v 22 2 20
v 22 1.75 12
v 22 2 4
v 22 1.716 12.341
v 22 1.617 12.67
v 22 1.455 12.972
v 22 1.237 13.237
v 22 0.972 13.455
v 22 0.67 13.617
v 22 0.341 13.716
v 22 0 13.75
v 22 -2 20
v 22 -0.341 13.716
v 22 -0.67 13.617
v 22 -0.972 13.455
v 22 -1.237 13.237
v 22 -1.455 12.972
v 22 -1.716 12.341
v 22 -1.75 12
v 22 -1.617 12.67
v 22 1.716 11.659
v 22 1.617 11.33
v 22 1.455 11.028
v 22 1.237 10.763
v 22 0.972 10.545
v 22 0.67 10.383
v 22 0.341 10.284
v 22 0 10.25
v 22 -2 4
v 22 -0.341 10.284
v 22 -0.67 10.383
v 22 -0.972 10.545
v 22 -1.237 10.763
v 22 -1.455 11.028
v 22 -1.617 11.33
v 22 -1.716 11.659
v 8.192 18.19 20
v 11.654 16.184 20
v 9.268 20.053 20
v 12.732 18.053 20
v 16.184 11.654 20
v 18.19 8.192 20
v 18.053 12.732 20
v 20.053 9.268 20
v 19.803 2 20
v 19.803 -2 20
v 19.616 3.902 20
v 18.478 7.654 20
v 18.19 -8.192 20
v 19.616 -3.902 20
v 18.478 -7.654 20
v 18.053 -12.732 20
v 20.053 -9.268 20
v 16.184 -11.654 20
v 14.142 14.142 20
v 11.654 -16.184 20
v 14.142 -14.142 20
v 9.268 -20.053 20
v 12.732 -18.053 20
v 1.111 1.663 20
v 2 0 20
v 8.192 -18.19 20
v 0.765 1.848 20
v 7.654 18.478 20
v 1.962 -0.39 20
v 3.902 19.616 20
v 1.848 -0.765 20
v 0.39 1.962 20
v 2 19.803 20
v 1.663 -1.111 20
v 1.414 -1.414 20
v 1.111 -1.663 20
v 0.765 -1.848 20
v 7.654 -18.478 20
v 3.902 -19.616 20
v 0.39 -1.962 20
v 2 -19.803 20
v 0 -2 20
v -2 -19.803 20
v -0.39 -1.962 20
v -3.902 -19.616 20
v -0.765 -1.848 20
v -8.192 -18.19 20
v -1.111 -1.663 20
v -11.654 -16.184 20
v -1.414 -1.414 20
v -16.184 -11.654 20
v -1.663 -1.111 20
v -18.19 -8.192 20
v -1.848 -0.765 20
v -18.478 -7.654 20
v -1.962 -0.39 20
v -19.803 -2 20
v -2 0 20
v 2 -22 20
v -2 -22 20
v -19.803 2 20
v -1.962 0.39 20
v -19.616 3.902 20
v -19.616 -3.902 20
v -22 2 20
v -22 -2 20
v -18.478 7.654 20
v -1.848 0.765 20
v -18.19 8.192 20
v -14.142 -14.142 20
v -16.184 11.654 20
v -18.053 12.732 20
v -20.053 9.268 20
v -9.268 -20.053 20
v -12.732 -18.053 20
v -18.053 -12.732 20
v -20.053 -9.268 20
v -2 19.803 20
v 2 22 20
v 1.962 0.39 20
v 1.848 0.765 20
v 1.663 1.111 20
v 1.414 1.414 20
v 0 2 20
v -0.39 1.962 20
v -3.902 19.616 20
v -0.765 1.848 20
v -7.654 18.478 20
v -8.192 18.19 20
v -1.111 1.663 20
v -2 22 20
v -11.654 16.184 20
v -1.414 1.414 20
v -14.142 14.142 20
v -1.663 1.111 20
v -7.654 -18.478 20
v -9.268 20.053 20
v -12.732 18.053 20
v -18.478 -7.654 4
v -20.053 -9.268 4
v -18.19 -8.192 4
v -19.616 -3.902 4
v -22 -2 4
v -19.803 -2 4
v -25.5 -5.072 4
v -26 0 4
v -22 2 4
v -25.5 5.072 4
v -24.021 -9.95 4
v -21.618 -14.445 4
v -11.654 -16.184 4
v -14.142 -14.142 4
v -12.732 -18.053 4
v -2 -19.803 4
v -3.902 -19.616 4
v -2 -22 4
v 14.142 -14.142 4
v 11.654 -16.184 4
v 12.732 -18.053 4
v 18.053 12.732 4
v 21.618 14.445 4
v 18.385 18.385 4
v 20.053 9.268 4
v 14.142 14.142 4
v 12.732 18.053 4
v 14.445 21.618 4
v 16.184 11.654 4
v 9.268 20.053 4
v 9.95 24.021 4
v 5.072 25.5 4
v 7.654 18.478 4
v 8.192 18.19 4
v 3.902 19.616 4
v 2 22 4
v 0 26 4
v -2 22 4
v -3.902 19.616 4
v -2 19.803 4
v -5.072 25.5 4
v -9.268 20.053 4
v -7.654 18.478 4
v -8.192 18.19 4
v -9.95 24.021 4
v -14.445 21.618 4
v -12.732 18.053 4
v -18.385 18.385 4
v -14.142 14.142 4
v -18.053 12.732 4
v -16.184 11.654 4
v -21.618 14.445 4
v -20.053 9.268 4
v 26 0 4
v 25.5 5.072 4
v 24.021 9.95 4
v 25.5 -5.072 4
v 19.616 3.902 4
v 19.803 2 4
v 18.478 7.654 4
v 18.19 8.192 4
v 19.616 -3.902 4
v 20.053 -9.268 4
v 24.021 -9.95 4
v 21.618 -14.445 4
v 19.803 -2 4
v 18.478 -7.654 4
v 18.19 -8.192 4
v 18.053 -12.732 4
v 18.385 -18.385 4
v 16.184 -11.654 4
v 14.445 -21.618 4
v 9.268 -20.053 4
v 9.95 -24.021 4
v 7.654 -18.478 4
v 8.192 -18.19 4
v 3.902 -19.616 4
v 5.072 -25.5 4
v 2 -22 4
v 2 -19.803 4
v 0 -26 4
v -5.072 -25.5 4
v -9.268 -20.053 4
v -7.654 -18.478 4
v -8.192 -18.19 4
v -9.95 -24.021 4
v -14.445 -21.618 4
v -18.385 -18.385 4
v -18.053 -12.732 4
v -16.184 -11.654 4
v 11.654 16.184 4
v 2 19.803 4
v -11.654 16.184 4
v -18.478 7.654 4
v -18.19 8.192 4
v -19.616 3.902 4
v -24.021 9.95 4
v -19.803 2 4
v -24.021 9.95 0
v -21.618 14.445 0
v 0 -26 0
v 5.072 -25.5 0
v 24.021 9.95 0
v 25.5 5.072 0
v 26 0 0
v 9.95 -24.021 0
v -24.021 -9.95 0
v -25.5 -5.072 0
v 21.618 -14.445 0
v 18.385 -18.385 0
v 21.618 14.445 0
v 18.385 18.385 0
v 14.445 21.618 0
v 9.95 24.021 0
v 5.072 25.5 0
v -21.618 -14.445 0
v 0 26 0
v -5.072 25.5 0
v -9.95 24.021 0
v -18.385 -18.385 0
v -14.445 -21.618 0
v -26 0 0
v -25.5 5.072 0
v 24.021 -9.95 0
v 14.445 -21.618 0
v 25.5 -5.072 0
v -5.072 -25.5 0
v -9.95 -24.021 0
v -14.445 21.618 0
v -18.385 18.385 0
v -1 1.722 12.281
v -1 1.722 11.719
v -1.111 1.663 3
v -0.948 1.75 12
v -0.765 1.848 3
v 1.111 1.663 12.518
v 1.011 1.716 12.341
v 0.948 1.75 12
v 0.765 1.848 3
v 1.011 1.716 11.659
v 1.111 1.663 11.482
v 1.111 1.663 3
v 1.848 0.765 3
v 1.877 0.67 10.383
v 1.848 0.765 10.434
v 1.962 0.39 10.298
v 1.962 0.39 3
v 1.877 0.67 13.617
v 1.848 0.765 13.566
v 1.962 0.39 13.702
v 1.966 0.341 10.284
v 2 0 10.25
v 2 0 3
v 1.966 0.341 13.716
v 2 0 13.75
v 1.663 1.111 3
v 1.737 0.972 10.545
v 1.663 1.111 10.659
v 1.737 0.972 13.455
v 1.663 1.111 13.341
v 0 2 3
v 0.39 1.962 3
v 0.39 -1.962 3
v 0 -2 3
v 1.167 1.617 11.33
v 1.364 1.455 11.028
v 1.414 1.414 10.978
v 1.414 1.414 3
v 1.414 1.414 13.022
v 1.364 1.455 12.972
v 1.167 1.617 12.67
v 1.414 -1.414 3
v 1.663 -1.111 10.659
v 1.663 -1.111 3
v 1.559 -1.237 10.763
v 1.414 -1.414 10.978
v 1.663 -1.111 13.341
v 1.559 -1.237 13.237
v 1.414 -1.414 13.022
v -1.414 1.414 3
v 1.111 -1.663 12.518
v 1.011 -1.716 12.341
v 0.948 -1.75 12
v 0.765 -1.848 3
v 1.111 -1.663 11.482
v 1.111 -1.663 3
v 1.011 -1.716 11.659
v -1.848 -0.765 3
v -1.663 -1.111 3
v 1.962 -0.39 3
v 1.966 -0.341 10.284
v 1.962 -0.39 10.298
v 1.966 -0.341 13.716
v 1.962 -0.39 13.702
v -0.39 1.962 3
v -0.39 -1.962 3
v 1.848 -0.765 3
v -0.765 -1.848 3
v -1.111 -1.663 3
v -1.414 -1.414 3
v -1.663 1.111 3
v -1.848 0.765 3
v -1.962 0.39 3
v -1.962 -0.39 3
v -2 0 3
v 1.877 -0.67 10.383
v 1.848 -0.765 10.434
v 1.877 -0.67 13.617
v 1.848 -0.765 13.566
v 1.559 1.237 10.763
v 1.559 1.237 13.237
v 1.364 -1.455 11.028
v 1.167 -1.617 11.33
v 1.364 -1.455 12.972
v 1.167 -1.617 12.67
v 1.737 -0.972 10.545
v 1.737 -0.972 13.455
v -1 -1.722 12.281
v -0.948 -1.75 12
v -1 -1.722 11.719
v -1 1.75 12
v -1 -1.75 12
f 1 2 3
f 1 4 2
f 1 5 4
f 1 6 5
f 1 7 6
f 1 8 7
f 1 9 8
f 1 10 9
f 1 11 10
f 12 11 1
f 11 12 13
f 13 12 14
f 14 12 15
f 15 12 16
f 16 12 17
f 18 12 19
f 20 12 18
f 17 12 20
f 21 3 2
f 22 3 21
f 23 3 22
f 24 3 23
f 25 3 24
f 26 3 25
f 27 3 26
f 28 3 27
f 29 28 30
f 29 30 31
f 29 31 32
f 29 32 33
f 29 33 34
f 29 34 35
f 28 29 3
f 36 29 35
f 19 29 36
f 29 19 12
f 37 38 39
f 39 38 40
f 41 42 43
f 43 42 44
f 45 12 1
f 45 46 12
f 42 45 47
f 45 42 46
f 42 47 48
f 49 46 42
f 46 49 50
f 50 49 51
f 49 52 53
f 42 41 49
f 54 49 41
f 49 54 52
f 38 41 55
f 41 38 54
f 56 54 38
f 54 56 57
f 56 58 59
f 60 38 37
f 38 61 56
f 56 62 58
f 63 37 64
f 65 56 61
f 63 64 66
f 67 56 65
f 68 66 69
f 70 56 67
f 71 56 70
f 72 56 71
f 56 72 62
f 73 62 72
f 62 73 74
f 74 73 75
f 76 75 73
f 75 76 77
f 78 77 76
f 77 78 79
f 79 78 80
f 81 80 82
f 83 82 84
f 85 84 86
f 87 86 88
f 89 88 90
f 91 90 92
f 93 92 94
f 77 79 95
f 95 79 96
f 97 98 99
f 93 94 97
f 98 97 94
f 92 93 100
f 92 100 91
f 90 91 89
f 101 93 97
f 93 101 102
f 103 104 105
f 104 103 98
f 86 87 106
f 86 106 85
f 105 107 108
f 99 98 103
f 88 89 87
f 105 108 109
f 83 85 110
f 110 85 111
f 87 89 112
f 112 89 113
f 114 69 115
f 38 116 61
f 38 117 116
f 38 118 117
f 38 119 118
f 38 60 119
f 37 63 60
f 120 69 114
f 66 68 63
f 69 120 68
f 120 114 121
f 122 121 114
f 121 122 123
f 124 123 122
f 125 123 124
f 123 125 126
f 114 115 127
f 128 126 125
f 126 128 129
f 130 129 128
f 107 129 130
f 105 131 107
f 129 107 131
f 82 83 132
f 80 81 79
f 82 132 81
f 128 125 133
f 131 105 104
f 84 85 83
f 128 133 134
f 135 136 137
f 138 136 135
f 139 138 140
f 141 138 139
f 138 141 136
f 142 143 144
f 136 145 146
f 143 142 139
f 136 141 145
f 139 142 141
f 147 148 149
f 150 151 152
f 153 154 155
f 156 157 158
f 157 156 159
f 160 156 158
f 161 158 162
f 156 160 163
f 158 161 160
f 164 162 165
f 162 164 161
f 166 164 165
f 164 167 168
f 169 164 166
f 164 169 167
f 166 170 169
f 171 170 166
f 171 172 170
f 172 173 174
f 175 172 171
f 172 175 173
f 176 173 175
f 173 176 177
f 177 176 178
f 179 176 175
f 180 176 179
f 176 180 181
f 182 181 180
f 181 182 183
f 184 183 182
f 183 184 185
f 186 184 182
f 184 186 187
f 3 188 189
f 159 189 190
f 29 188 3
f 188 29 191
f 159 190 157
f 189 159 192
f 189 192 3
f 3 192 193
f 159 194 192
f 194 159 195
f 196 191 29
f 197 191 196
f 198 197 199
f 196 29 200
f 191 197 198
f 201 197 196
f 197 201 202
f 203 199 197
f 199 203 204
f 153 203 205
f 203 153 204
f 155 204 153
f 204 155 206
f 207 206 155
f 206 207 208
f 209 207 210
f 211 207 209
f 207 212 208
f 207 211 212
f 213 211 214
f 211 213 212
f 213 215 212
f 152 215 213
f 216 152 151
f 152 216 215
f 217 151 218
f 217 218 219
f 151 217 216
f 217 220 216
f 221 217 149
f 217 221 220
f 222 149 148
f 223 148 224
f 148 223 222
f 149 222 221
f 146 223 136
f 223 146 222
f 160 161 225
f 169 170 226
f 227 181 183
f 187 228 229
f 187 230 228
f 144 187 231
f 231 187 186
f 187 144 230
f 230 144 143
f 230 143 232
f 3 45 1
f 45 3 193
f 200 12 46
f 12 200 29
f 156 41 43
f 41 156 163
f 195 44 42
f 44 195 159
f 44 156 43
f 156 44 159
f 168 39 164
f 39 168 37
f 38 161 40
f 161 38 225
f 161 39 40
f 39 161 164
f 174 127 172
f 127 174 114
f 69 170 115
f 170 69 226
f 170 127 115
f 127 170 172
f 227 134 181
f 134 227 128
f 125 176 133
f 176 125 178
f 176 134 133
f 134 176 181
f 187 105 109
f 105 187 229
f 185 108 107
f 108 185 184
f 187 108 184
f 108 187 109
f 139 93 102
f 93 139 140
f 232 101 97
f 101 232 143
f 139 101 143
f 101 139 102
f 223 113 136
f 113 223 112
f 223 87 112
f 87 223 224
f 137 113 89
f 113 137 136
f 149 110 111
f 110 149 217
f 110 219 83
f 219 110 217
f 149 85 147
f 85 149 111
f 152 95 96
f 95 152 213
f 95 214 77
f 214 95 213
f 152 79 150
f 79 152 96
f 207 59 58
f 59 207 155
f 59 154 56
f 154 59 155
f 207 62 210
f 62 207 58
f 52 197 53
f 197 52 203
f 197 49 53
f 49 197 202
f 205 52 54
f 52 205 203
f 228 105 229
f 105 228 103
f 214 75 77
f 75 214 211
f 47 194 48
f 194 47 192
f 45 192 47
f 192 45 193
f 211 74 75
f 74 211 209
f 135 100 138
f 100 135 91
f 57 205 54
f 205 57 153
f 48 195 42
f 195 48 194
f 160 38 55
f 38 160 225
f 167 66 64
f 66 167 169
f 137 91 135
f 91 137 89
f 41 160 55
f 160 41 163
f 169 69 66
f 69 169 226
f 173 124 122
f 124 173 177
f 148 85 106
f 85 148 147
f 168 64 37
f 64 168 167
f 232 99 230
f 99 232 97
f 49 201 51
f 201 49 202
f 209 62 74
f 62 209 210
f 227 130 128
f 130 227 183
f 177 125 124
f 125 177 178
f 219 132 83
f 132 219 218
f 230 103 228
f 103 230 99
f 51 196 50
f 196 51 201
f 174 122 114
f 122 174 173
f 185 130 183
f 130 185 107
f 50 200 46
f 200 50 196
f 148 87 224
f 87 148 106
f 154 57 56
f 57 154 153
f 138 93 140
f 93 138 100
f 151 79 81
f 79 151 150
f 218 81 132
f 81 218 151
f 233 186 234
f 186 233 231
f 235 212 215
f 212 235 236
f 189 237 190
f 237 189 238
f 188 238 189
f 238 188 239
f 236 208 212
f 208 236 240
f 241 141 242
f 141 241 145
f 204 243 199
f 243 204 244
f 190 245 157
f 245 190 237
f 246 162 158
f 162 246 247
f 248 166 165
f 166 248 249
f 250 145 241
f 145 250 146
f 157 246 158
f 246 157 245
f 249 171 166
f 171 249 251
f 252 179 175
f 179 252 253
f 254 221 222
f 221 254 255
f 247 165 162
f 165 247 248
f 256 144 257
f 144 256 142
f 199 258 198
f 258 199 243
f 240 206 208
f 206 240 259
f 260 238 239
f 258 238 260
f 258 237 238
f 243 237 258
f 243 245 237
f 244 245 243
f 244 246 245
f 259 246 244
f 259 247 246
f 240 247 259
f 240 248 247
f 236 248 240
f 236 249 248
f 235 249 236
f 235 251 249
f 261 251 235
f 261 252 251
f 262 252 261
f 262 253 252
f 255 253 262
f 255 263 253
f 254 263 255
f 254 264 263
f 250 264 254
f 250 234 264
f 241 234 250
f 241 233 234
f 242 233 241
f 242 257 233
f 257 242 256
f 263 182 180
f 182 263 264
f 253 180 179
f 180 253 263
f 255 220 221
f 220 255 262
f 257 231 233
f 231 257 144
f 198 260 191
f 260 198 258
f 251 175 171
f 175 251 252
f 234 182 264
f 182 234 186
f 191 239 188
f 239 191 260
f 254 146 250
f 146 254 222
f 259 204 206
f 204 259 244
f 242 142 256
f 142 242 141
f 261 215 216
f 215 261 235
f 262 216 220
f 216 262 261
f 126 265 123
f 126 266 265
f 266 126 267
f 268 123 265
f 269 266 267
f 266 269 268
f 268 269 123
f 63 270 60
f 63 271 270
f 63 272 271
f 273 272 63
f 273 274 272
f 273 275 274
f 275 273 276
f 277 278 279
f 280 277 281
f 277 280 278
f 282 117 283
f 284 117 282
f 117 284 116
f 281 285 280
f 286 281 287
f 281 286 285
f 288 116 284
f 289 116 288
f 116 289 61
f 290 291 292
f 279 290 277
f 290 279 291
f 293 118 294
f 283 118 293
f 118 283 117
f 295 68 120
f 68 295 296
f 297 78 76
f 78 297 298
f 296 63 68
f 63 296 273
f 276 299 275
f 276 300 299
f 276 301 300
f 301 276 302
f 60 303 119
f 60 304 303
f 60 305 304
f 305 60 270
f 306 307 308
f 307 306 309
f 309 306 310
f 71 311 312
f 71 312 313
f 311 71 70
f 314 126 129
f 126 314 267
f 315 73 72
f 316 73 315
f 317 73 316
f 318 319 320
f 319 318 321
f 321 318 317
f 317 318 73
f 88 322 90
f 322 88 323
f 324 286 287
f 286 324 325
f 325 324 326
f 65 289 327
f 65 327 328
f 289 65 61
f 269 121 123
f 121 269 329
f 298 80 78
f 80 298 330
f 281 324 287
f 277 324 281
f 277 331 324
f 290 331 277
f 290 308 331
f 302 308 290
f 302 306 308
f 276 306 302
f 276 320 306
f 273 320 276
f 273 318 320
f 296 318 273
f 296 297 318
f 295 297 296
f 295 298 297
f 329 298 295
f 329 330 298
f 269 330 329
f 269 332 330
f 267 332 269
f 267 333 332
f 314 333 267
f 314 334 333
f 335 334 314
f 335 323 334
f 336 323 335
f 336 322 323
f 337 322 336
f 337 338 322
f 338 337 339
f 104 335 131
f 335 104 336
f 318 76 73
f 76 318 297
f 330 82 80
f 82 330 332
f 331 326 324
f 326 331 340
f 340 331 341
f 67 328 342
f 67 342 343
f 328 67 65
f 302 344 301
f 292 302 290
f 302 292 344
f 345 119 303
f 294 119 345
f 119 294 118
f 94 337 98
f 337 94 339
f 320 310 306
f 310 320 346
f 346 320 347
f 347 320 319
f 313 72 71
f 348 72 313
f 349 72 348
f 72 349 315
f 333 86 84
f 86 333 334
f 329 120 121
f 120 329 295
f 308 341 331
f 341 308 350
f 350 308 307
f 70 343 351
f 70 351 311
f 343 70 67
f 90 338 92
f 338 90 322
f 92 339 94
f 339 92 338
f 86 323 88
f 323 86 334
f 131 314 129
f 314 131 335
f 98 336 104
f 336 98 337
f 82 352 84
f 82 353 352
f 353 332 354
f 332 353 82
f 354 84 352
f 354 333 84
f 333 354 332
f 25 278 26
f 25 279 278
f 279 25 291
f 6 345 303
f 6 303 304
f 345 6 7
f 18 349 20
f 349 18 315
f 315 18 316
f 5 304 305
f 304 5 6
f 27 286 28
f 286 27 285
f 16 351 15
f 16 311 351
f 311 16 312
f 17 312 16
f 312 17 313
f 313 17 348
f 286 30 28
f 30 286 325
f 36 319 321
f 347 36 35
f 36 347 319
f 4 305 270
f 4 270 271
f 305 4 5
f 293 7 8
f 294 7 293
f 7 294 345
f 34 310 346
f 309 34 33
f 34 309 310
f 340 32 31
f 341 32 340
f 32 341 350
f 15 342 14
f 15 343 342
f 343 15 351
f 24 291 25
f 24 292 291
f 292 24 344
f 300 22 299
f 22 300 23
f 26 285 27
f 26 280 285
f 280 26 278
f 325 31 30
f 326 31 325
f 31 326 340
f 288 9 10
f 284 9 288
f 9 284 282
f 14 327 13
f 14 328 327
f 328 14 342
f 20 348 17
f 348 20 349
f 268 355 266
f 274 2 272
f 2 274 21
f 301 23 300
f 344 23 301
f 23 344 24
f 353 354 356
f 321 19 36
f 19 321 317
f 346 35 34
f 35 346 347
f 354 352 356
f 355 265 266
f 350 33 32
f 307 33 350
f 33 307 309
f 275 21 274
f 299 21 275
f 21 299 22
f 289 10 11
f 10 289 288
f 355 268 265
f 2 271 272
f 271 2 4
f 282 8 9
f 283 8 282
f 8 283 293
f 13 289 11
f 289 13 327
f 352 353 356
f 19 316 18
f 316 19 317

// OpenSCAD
$fn = 32;

// ----------------------------------------------------------------------
// Control knob: skirt knob with grip ribs
// ----------------------------------------------------------------------

// --- parameters (mm) ---
skirt_d = 52;             // skirt diameter
skirt_t = 4;              // skirt thickness
rib_w = 4;                // grip rib width
rib_out = 3;              // grip rib radial protrusion
n_ribs = 12;              // number of grip ribs
knob_d = 40;              // knob body diameter
knob_h = 16;              // knob body height
bore_d = 4;               // shaft bore diameter
set_d = 3.5;              // set screw bore diameter

rib_step = 360 / n_ribs;  // rib angular step
total_h = skirt_t + knob_h;  // overall height

difference() {
  union() {
    translate([0, 0, skirt_t]) cylinder(h = knob_h, d = knob_d);
    cylinder(h = skirt_t, d = skirt_d);
    for (i = [0 : n_ribs - 1])
      rotate([0, 0, i * rib_step])
        translate([knob_d / 2 - 1, -rib_w / 2, skirt_t])
          cube([rib_out, rib_w, knob_h]);
  }
  translate([0, 0, skirt_t - 1]) cylinder(h = knob_h + 2, d = bore_d);
  translate([-1, 0, skirt_t + knob_h / 2]) rotate([0, 90, 0])
    cylinder(h = knob_d / 2 + bore_d / 2 + 2, d = set_d);
}
